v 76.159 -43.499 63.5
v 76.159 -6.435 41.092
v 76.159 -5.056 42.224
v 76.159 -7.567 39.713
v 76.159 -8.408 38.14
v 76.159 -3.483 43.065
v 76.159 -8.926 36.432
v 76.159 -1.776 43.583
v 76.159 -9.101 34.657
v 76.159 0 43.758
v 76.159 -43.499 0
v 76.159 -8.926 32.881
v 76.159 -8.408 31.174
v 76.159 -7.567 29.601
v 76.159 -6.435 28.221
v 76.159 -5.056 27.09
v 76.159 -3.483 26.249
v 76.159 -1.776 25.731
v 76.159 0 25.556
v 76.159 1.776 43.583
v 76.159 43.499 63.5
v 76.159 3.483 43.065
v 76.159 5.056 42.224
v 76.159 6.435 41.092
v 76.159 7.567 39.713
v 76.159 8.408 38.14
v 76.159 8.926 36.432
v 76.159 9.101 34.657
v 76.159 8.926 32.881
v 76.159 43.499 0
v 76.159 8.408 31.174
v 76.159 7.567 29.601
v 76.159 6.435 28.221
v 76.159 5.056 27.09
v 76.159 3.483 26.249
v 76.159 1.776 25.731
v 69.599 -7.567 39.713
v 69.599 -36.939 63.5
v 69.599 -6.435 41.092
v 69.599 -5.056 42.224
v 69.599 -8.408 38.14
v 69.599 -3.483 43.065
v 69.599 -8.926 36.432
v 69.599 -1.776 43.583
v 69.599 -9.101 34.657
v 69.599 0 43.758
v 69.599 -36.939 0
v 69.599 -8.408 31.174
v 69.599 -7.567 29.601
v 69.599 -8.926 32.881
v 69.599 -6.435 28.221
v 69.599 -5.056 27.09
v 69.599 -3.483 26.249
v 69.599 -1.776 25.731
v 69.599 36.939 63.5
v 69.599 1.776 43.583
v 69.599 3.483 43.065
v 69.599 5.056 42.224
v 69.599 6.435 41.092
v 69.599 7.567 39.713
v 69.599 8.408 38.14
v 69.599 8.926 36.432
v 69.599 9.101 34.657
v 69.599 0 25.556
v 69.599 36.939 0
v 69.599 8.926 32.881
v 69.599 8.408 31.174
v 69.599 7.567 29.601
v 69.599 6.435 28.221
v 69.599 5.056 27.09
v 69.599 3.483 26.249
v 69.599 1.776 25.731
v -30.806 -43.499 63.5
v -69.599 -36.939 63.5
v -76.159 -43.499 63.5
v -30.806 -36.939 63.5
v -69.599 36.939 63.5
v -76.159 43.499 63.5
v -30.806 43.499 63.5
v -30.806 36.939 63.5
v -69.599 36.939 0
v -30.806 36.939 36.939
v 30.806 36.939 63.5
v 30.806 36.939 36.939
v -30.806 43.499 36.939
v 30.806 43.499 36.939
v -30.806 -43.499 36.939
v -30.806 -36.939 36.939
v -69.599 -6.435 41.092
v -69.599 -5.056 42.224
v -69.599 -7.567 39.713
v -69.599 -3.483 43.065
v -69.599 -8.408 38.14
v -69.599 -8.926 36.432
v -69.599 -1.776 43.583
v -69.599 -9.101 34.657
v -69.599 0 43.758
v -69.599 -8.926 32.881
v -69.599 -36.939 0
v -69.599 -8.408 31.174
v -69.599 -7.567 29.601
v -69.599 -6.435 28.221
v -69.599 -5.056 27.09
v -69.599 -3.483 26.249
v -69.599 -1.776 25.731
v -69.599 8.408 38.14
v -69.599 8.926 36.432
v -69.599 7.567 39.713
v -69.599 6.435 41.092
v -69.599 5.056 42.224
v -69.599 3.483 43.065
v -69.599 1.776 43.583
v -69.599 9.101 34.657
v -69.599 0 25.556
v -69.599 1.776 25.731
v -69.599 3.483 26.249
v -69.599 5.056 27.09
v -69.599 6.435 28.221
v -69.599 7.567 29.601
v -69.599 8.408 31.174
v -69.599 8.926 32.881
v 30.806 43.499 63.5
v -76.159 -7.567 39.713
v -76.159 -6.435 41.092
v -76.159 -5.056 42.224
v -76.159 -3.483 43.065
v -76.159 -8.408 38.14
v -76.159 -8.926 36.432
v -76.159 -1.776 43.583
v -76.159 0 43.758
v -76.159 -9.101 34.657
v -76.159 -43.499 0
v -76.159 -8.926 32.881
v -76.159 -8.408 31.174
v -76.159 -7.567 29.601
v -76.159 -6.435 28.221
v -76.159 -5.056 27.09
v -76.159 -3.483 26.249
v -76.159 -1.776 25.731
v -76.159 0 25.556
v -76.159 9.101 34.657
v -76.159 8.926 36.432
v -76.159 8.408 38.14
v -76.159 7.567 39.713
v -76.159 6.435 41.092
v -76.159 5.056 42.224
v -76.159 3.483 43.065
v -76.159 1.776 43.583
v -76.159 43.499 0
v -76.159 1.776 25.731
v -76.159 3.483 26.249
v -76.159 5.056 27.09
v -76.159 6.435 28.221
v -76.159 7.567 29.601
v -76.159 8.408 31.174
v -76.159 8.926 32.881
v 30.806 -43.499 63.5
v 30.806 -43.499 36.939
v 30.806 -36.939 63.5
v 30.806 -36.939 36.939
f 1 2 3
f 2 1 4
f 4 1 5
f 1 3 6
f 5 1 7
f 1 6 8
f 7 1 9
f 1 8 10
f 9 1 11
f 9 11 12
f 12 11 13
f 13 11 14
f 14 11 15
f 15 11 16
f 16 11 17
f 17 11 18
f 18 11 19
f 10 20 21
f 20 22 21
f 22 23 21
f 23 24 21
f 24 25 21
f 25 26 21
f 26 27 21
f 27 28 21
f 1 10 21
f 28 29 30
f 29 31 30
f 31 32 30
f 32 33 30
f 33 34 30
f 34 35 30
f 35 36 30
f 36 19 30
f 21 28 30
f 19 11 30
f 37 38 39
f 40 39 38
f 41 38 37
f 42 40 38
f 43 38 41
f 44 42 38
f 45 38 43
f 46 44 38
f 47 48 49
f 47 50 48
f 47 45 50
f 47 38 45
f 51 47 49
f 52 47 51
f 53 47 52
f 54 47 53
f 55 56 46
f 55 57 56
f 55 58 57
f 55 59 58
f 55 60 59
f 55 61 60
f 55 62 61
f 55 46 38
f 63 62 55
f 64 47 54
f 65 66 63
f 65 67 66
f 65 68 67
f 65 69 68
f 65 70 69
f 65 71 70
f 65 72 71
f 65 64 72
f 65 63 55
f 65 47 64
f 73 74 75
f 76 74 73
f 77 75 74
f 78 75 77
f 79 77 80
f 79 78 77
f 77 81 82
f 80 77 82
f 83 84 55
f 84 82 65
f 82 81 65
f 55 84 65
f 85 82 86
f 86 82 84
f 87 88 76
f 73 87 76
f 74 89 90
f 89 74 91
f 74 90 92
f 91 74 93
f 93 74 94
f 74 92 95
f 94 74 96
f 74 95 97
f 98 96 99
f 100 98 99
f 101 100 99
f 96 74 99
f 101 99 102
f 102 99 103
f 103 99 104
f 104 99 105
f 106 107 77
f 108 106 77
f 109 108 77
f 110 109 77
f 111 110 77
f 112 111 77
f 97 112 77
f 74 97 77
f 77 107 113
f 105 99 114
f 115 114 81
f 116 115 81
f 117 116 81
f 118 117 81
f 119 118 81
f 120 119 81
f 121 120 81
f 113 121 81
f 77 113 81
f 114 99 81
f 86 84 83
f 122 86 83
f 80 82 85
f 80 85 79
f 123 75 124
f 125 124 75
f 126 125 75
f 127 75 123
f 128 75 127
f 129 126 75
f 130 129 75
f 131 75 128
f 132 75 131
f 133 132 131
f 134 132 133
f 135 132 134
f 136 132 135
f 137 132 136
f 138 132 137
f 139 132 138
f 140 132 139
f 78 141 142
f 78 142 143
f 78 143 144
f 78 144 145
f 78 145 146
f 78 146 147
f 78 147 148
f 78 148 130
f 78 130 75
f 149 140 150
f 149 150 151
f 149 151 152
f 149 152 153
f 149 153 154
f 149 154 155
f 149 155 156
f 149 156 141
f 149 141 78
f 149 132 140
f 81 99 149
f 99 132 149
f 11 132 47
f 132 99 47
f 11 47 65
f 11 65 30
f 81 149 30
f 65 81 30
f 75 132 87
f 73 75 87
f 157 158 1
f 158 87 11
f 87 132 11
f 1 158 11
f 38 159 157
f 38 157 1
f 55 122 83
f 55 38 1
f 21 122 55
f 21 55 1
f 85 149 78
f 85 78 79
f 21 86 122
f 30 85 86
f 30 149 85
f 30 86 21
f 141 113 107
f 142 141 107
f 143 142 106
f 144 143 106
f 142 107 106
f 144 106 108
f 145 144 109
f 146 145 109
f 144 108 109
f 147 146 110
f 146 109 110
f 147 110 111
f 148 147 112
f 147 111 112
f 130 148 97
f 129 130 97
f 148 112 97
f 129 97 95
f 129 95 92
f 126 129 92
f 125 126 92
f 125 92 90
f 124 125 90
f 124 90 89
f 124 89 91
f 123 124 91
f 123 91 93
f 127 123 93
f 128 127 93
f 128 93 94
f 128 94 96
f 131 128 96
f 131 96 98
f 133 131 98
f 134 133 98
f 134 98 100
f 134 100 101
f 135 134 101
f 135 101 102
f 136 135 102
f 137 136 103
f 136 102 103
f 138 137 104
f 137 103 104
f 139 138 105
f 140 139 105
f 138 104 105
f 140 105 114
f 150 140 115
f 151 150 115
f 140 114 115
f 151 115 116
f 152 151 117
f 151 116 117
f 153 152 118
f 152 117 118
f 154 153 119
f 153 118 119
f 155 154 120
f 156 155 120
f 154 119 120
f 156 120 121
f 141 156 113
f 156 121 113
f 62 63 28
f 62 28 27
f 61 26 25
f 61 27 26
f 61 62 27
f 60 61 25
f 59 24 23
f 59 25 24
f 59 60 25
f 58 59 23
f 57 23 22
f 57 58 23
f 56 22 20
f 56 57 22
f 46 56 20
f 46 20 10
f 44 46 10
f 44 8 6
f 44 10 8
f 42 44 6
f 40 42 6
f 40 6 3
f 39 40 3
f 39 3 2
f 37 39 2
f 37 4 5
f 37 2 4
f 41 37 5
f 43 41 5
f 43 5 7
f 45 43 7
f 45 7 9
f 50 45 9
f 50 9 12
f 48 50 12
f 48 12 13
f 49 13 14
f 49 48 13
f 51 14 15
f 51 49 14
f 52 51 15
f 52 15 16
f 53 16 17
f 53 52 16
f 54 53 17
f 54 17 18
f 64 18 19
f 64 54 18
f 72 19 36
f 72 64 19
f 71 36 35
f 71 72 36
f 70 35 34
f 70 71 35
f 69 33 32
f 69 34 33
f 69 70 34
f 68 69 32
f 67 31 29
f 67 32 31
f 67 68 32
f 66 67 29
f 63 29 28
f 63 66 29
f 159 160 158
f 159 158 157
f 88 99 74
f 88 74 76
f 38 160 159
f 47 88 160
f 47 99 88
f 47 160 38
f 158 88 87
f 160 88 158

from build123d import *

# Parameters (mm, degrees)
F0_W          = 152.3185074329
F0_H          = 86.9983956218
F0_W_2        = 139.1974389553
F0_H_2        = 73.8773271441
F1_DEPTH      = 63.5
F2_W          = 61.6119801998
F2_H          = 38.222245872
F3_DEPTH      = 50.8
F3_DEPTH_BACK = 50.8
F4_R          = 9.10092064
F5_DEPTH      = 101.6
F5_DEPTH_BACK = 101.6


with BuildPart() as f1:
    # F0 (on Top) → F1 (new body)
    with BuildSketch(Plane.XY):
        Rectangle(F0_W, F0_H)
        Rectangle(F0_W_2, F0_H_2, mode=Mode.SUBTRACT)
    extrude(amount=F1_DEPTH)

    # F2 (on Front) → F3 (cut, two sides)
    with BuildSketch(Plane.XZ) as f3_sk:
        with Locations((0, 56.0497865081)):
            Rectangle(F2_W, F2_H)
    extrude(amount=F3_DEPTH, mode=Mode.SUBTRACT)
    extrude(f3_sk.sketch, amount=-F3_DEPTH_BACK, mode=Mode.SUBTRACT)

    # F4 (on Right) → F5 (cut, two sides)
    with BuildSketch(Plane.YZ) as f5_sk:
        with Locations((0, 34.656740725)):
            Circle(F4_R)
    extrude(amount=-F5_DEPTH, mode=Mode.SUBTRACT)
    extrude(f5_sk.sketch, amount=F5_DEPTH_BACK, mode=Mode.SUBTRACT)


solid = f1.part
